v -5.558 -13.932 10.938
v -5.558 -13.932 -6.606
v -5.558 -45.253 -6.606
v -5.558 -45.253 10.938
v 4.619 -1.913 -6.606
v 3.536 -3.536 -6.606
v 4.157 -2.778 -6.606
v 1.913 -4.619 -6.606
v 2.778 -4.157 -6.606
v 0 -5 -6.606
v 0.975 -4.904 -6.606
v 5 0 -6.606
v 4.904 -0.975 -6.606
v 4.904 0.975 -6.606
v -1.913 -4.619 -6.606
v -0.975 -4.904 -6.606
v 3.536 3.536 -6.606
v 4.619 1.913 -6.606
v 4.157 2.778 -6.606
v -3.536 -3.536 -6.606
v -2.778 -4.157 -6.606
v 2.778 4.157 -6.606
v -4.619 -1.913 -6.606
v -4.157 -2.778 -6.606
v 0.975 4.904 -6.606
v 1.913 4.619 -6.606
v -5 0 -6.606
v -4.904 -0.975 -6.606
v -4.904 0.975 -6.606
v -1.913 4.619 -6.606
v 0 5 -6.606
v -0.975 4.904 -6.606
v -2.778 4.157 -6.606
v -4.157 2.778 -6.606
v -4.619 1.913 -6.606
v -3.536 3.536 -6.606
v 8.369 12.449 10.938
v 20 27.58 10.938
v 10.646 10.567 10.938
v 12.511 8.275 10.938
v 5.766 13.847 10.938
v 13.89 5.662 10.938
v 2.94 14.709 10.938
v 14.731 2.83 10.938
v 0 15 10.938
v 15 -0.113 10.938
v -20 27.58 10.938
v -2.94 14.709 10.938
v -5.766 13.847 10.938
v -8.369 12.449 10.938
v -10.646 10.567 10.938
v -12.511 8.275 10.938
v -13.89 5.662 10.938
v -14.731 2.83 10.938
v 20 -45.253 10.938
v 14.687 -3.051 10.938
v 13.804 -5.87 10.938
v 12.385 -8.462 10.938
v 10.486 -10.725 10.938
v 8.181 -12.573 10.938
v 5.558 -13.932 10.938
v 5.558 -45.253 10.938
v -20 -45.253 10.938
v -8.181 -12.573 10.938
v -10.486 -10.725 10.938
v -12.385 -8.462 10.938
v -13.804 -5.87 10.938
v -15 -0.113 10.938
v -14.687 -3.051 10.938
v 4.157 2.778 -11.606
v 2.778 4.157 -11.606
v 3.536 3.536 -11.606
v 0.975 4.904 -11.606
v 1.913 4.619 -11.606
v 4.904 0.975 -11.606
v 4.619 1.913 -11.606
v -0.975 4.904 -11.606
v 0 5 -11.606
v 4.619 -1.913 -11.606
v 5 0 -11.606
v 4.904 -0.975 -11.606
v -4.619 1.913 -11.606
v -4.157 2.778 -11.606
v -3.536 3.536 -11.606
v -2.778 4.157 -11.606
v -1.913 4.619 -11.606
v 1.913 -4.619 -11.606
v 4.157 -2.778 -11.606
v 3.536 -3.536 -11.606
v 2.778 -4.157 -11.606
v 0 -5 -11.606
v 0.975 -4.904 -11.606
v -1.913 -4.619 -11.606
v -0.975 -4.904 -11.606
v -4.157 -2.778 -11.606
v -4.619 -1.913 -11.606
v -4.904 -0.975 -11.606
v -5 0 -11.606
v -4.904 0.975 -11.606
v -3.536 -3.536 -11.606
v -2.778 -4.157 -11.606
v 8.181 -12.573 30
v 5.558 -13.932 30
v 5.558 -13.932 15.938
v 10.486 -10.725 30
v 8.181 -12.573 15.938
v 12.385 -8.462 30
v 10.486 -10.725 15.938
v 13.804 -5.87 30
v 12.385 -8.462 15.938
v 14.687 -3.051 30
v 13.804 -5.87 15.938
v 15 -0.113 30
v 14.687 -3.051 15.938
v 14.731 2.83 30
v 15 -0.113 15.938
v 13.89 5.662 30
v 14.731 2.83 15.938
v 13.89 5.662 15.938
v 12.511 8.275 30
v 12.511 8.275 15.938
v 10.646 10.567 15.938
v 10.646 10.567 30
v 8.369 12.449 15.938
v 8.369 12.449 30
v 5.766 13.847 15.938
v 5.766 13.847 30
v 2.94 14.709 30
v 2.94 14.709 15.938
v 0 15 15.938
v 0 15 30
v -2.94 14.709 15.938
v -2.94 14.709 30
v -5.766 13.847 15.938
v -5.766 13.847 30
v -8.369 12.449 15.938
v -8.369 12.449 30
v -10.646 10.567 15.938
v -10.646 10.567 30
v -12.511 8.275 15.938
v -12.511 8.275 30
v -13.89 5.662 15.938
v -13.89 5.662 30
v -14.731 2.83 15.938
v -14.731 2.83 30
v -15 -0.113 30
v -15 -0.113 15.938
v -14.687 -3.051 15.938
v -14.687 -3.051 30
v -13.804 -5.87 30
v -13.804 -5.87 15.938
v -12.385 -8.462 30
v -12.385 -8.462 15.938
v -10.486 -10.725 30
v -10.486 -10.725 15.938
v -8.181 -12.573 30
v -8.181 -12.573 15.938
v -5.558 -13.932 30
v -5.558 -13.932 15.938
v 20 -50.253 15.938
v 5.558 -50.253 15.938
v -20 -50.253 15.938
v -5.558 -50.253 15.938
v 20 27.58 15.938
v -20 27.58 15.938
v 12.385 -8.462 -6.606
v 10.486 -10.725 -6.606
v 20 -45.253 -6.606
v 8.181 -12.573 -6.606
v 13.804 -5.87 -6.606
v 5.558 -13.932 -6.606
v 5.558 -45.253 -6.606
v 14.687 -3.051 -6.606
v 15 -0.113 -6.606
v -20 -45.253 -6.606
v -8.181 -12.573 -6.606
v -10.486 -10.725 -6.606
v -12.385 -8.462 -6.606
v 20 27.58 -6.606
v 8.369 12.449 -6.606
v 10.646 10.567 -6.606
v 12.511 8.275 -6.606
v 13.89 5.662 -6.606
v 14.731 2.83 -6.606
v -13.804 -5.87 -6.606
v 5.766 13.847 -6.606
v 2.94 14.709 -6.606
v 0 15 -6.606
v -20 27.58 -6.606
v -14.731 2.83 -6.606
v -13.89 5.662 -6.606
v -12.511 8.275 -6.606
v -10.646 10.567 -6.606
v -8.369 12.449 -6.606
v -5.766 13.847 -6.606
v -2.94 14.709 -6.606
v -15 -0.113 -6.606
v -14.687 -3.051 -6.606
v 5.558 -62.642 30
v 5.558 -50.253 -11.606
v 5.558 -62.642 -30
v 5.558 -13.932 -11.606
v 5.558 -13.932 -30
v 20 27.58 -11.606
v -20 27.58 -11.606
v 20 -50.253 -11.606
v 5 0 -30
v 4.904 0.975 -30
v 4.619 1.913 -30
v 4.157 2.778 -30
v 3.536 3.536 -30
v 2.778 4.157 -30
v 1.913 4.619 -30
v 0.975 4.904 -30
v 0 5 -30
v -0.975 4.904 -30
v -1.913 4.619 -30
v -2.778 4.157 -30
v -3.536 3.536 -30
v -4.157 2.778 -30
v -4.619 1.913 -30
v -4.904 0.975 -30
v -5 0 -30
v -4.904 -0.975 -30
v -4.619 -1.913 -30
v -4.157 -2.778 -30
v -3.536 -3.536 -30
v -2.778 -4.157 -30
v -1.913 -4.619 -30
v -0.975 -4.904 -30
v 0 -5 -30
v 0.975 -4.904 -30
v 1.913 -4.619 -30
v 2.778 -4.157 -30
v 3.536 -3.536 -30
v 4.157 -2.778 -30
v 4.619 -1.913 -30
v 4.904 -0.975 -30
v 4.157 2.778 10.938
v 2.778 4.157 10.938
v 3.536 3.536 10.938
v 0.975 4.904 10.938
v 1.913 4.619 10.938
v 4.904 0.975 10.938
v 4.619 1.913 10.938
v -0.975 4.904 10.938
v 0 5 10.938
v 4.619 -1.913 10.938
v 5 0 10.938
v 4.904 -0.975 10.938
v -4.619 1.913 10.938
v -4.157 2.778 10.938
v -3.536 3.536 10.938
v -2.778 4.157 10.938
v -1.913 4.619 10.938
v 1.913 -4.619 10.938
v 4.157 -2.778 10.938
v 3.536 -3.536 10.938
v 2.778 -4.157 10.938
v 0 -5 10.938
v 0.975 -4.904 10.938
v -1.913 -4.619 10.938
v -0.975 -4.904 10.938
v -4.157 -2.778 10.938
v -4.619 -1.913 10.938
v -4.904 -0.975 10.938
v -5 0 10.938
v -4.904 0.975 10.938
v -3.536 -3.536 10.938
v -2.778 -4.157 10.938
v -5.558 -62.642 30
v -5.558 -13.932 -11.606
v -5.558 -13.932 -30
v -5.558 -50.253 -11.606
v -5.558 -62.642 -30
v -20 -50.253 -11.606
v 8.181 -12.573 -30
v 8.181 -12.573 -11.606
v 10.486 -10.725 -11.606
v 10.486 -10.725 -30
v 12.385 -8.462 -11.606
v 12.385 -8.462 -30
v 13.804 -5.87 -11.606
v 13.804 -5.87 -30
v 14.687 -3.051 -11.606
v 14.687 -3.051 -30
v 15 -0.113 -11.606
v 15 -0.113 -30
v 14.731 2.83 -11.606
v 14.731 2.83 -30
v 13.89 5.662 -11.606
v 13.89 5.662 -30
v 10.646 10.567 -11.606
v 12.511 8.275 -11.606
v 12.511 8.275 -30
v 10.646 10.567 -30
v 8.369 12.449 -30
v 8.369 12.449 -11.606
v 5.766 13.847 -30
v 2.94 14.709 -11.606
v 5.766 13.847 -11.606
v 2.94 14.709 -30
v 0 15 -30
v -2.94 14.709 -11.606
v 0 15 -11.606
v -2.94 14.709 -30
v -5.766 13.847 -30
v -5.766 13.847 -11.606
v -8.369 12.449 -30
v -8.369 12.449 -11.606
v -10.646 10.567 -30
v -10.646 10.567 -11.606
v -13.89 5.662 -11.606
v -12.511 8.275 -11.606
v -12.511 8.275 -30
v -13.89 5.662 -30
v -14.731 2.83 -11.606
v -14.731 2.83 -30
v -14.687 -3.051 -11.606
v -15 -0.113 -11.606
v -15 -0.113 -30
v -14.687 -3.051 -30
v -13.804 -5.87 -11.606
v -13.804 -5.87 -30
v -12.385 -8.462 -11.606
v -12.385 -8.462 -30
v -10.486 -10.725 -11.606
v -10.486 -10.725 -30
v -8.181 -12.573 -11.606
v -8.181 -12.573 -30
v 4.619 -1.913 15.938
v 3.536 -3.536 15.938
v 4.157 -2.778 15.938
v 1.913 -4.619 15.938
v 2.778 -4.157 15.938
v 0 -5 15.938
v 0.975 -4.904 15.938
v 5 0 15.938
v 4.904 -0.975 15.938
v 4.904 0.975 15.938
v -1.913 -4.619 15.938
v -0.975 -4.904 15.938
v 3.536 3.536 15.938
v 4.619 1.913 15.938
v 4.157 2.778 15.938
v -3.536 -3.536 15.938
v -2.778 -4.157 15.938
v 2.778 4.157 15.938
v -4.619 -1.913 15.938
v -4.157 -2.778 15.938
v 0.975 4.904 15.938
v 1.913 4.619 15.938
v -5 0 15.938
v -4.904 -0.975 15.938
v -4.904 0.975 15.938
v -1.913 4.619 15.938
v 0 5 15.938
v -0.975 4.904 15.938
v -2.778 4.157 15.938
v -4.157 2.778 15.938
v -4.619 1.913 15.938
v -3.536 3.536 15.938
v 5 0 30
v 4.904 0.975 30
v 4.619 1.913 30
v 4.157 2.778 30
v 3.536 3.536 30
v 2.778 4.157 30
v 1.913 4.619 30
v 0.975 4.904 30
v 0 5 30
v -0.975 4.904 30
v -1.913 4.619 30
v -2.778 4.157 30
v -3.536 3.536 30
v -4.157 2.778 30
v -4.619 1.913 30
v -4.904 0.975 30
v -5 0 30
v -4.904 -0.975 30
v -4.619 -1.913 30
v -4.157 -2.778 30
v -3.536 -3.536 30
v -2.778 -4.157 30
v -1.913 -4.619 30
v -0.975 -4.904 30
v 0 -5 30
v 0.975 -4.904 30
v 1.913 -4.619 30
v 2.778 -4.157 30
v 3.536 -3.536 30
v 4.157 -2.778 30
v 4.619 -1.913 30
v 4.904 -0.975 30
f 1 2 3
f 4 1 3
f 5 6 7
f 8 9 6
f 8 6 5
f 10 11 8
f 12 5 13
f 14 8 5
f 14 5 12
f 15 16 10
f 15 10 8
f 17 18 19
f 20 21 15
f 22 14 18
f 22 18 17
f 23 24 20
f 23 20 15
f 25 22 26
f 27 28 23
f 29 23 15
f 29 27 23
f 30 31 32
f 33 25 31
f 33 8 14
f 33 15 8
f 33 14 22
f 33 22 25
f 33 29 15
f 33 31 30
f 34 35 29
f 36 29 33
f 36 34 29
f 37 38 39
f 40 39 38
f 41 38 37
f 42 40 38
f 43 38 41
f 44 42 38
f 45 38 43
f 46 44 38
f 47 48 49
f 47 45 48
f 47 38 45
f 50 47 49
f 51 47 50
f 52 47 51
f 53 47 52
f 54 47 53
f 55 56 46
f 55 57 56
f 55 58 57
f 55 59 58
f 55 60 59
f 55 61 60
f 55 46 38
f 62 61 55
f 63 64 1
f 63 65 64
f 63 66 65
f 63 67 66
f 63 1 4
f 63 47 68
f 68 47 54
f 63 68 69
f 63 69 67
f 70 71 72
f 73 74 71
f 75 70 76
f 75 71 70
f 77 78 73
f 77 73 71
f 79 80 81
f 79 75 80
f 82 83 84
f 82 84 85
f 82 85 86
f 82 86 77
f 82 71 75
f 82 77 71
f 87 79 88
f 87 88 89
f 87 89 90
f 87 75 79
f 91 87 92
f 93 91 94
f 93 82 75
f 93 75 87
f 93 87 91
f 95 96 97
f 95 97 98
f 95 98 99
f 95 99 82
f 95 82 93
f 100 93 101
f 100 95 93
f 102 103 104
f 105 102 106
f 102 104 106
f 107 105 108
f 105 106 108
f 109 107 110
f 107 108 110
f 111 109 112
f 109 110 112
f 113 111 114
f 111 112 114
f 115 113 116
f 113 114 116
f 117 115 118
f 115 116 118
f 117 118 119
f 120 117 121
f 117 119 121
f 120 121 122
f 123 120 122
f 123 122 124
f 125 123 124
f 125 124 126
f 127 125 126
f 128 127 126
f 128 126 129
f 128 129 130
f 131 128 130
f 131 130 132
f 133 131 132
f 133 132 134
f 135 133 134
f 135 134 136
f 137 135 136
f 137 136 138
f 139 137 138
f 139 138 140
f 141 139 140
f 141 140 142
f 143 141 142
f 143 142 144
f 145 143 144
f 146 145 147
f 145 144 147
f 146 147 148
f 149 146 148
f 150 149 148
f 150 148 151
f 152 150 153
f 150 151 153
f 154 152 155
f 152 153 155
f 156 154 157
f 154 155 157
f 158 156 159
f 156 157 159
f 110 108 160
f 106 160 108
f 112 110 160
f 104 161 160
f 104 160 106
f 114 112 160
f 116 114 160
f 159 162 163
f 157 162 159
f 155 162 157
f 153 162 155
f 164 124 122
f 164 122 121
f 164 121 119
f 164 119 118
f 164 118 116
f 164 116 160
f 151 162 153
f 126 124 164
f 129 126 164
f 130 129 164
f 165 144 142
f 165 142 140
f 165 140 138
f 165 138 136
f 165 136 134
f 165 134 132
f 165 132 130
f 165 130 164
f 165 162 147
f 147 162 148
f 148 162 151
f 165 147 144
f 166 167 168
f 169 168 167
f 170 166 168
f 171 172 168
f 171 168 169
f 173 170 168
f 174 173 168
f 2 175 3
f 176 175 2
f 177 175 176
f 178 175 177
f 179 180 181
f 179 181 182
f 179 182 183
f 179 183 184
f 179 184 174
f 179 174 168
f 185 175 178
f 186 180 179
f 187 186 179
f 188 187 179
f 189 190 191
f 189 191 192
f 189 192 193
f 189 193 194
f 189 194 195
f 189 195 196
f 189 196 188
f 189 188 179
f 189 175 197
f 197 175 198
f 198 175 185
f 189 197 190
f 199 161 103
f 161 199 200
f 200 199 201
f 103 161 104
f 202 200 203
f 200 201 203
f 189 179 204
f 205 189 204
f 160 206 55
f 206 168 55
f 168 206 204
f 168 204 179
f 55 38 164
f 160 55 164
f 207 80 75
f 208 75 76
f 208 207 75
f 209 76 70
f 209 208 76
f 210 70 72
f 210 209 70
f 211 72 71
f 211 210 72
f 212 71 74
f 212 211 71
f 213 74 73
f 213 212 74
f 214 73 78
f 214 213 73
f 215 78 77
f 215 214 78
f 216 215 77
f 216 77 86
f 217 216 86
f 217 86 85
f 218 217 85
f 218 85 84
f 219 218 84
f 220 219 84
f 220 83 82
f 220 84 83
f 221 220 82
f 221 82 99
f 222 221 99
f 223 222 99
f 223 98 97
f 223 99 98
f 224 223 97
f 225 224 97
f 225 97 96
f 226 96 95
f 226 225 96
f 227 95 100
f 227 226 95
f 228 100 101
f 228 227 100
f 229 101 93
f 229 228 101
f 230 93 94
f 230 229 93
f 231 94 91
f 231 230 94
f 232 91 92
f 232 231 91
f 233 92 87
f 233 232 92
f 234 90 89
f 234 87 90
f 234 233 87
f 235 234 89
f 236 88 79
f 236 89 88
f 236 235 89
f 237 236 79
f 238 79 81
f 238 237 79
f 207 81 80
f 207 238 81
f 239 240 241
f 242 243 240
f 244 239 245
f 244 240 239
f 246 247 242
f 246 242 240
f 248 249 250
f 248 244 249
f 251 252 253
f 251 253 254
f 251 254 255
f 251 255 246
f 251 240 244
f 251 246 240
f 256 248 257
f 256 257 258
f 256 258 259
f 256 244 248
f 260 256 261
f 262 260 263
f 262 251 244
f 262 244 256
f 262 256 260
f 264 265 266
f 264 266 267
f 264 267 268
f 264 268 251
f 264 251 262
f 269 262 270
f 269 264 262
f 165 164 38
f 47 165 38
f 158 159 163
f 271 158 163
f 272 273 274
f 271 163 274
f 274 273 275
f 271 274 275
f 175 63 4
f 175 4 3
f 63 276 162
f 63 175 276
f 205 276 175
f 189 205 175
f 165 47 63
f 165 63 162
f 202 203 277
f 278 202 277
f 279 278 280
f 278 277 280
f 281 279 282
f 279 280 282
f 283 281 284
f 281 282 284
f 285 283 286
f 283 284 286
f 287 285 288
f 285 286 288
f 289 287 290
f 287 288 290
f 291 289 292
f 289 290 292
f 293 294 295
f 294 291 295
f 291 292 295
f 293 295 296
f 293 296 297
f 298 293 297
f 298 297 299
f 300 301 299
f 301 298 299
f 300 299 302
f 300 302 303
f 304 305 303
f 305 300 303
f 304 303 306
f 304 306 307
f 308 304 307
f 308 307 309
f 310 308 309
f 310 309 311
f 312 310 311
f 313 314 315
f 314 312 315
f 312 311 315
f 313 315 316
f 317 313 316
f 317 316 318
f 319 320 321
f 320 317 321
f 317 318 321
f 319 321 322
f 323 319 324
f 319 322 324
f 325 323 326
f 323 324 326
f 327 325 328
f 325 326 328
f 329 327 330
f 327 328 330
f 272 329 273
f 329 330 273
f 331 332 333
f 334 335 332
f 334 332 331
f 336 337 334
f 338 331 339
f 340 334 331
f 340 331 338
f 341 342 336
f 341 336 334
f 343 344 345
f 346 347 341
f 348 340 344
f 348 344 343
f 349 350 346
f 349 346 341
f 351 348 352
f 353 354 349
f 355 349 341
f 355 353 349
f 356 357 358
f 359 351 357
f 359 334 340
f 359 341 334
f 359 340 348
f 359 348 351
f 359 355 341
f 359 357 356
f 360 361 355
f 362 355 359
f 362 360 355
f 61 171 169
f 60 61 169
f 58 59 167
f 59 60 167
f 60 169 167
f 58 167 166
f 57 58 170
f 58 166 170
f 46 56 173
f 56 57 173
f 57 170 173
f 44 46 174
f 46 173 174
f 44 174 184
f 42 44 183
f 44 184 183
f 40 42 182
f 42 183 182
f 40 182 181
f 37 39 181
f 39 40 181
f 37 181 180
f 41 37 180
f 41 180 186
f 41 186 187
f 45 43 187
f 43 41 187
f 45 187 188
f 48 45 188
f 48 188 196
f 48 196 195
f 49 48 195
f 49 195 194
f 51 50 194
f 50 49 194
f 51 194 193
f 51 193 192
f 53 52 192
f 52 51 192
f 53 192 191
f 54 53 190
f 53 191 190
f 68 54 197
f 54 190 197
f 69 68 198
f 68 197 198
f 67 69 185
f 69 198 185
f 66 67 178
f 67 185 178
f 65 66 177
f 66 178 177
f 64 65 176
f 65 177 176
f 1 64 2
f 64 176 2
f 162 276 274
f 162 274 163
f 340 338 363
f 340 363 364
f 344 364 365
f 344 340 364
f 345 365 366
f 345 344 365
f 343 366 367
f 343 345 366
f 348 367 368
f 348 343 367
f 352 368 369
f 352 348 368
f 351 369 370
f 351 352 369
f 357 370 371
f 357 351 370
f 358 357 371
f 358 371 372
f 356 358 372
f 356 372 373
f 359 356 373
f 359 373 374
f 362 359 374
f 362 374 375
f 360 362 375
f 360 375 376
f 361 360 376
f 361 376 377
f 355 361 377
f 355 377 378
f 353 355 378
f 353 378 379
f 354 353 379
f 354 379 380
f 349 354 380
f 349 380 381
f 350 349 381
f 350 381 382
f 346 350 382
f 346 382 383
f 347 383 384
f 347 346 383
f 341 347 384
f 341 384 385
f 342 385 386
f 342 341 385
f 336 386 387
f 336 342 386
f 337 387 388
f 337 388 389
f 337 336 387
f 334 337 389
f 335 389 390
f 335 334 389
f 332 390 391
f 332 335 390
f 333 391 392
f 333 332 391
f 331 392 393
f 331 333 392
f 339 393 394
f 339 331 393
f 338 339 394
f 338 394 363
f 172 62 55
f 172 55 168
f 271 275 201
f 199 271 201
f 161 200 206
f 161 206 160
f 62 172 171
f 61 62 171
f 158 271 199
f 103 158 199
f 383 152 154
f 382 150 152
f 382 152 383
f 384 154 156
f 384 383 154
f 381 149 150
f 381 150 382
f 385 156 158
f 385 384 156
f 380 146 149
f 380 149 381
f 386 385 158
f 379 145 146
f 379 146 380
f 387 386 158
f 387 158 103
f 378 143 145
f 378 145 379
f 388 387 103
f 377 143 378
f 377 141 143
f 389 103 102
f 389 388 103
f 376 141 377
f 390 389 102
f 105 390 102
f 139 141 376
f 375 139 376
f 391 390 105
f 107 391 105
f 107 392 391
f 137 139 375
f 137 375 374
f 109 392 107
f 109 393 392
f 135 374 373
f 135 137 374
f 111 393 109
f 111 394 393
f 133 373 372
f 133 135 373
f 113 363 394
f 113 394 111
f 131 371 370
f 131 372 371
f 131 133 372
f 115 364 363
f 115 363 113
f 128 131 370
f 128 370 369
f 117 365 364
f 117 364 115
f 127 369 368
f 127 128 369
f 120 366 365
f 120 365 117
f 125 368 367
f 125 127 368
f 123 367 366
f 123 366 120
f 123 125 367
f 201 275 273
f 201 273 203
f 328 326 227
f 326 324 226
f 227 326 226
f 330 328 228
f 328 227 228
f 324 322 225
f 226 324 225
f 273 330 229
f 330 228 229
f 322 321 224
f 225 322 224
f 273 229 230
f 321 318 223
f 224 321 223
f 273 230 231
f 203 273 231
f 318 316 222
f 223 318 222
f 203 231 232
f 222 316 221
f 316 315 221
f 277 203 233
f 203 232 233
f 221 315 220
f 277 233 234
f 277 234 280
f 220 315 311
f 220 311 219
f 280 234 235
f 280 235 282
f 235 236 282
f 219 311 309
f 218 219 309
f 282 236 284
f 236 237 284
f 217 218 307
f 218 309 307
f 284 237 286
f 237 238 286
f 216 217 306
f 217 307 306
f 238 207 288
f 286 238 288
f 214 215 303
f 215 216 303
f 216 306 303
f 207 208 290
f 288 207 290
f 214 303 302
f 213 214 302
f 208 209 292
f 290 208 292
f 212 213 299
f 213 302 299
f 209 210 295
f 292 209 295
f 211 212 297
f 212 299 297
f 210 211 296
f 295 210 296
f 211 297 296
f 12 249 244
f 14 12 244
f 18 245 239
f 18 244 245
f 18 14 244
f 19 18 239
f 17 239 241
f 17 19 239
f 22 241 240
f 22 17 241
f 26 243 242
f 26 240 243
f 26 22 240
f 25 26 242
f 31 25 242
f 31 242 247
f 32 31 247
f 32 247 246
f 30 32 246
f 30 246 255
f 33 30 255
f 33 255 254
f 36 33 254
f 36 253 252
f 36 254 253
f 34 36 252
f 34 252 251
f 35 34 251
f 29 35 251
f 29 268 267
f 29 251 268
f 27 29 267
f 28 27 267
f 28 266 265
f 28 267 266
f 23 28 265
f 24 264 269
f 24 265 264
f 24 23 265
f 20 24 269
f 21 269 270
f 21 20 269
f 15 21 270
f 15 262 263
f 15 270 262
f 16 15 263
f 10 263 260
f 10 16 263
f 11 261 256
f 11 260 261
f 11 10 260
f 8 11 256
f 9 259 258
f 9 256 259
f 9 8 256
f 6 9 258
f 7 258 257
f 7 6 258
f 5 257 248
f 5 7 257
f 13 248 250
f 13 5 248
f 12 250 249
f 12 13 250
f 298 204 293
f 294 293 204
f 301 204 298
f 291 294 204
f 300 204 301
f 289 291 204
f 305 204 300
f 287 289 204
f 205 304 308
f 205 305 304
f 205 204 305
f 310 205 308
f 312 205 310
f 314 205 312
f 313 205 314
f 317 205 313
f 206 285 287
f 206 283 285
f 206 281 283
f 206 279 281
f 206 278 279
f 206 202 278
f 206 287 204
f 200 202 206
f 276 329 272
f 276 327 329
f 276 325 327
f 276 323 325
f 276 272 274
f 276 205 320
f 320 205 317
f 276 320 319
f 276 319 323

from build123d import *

# Parameters (mm, degrees)
EXTRUDE_5_DEPTH      = 30
EXTRUDE_5_DEPTH_BACK = 30
F_1_FR_R             = 5
EXTRUDE_6_DEPTH      = 20
EXTRUDE_6_DEPTH_BACK = 20


with BuildPart() as part:
    # Эскиз1_fr → Бобышка-Вытянуть5 (new, two sides: drawn at the far end of the back side and taken through both)
    with BuildSketch(Plane.XY.offset(-EXTRUDE_5_DEPTH_BACK)):
        with BuildLine():
            Line((-5.557606452, -13.932444528), (-5.557606452, -62.642280008))
            Line((-5.557606452, -62.642280008), (5.557606452, -62.642280008))
            Line((5.557606452, -62.642280008), (5.557606452, -13.932444528))
            ThreePointArc((5.557606452, -13.932444528), (0, 15), (-5.557606452, -13.932444528))
        make_face()
        Circle(F_1_FR_R, mode=Mode.SUBTRACT)
    extrude(amount=EXTRUDE_5_DEPTH + EXTRUDE_5_DEPTH_BACK)


with BuildPart() as body_2:
    # Эскиз3 → Бобышка-Вытянуть6 (new, two sides: drawn at the far end of the back side and taken through both)
    with BuildSketch(Plane(origin=(0, 0, 0), x_dir=(0, 0, -1), z_dir=(1, 0, 0)).offset(-EXTRUDE_6_DEPTH_BACK)):
        Polygon((-58.394498043, -50.25314581), (-85.938130262, -50.25314581), (-85.938130262, 27.580465306), (-80.938130262, 27.580465306), (-80.938130262, -45.25314581), (-63.394498043, -45.25314581), (-63.394498043, 27.580465306), (-58.394498043, 27.580465306), align=None)
    extrude(amount=EXTRUDE_6_DEPTH + EXTRUDE_6_DEPTH_BACK)


with BuildPart() as body_2_1:
    # Move Body 1: moved
    add(body_2.part.moved(Location((0, 0, -70))))


with BuildPart() as part_1:
    add(part.part)

    # Combine 1: union body 2
    add(body_2_1.part)


solid = part_1.part
